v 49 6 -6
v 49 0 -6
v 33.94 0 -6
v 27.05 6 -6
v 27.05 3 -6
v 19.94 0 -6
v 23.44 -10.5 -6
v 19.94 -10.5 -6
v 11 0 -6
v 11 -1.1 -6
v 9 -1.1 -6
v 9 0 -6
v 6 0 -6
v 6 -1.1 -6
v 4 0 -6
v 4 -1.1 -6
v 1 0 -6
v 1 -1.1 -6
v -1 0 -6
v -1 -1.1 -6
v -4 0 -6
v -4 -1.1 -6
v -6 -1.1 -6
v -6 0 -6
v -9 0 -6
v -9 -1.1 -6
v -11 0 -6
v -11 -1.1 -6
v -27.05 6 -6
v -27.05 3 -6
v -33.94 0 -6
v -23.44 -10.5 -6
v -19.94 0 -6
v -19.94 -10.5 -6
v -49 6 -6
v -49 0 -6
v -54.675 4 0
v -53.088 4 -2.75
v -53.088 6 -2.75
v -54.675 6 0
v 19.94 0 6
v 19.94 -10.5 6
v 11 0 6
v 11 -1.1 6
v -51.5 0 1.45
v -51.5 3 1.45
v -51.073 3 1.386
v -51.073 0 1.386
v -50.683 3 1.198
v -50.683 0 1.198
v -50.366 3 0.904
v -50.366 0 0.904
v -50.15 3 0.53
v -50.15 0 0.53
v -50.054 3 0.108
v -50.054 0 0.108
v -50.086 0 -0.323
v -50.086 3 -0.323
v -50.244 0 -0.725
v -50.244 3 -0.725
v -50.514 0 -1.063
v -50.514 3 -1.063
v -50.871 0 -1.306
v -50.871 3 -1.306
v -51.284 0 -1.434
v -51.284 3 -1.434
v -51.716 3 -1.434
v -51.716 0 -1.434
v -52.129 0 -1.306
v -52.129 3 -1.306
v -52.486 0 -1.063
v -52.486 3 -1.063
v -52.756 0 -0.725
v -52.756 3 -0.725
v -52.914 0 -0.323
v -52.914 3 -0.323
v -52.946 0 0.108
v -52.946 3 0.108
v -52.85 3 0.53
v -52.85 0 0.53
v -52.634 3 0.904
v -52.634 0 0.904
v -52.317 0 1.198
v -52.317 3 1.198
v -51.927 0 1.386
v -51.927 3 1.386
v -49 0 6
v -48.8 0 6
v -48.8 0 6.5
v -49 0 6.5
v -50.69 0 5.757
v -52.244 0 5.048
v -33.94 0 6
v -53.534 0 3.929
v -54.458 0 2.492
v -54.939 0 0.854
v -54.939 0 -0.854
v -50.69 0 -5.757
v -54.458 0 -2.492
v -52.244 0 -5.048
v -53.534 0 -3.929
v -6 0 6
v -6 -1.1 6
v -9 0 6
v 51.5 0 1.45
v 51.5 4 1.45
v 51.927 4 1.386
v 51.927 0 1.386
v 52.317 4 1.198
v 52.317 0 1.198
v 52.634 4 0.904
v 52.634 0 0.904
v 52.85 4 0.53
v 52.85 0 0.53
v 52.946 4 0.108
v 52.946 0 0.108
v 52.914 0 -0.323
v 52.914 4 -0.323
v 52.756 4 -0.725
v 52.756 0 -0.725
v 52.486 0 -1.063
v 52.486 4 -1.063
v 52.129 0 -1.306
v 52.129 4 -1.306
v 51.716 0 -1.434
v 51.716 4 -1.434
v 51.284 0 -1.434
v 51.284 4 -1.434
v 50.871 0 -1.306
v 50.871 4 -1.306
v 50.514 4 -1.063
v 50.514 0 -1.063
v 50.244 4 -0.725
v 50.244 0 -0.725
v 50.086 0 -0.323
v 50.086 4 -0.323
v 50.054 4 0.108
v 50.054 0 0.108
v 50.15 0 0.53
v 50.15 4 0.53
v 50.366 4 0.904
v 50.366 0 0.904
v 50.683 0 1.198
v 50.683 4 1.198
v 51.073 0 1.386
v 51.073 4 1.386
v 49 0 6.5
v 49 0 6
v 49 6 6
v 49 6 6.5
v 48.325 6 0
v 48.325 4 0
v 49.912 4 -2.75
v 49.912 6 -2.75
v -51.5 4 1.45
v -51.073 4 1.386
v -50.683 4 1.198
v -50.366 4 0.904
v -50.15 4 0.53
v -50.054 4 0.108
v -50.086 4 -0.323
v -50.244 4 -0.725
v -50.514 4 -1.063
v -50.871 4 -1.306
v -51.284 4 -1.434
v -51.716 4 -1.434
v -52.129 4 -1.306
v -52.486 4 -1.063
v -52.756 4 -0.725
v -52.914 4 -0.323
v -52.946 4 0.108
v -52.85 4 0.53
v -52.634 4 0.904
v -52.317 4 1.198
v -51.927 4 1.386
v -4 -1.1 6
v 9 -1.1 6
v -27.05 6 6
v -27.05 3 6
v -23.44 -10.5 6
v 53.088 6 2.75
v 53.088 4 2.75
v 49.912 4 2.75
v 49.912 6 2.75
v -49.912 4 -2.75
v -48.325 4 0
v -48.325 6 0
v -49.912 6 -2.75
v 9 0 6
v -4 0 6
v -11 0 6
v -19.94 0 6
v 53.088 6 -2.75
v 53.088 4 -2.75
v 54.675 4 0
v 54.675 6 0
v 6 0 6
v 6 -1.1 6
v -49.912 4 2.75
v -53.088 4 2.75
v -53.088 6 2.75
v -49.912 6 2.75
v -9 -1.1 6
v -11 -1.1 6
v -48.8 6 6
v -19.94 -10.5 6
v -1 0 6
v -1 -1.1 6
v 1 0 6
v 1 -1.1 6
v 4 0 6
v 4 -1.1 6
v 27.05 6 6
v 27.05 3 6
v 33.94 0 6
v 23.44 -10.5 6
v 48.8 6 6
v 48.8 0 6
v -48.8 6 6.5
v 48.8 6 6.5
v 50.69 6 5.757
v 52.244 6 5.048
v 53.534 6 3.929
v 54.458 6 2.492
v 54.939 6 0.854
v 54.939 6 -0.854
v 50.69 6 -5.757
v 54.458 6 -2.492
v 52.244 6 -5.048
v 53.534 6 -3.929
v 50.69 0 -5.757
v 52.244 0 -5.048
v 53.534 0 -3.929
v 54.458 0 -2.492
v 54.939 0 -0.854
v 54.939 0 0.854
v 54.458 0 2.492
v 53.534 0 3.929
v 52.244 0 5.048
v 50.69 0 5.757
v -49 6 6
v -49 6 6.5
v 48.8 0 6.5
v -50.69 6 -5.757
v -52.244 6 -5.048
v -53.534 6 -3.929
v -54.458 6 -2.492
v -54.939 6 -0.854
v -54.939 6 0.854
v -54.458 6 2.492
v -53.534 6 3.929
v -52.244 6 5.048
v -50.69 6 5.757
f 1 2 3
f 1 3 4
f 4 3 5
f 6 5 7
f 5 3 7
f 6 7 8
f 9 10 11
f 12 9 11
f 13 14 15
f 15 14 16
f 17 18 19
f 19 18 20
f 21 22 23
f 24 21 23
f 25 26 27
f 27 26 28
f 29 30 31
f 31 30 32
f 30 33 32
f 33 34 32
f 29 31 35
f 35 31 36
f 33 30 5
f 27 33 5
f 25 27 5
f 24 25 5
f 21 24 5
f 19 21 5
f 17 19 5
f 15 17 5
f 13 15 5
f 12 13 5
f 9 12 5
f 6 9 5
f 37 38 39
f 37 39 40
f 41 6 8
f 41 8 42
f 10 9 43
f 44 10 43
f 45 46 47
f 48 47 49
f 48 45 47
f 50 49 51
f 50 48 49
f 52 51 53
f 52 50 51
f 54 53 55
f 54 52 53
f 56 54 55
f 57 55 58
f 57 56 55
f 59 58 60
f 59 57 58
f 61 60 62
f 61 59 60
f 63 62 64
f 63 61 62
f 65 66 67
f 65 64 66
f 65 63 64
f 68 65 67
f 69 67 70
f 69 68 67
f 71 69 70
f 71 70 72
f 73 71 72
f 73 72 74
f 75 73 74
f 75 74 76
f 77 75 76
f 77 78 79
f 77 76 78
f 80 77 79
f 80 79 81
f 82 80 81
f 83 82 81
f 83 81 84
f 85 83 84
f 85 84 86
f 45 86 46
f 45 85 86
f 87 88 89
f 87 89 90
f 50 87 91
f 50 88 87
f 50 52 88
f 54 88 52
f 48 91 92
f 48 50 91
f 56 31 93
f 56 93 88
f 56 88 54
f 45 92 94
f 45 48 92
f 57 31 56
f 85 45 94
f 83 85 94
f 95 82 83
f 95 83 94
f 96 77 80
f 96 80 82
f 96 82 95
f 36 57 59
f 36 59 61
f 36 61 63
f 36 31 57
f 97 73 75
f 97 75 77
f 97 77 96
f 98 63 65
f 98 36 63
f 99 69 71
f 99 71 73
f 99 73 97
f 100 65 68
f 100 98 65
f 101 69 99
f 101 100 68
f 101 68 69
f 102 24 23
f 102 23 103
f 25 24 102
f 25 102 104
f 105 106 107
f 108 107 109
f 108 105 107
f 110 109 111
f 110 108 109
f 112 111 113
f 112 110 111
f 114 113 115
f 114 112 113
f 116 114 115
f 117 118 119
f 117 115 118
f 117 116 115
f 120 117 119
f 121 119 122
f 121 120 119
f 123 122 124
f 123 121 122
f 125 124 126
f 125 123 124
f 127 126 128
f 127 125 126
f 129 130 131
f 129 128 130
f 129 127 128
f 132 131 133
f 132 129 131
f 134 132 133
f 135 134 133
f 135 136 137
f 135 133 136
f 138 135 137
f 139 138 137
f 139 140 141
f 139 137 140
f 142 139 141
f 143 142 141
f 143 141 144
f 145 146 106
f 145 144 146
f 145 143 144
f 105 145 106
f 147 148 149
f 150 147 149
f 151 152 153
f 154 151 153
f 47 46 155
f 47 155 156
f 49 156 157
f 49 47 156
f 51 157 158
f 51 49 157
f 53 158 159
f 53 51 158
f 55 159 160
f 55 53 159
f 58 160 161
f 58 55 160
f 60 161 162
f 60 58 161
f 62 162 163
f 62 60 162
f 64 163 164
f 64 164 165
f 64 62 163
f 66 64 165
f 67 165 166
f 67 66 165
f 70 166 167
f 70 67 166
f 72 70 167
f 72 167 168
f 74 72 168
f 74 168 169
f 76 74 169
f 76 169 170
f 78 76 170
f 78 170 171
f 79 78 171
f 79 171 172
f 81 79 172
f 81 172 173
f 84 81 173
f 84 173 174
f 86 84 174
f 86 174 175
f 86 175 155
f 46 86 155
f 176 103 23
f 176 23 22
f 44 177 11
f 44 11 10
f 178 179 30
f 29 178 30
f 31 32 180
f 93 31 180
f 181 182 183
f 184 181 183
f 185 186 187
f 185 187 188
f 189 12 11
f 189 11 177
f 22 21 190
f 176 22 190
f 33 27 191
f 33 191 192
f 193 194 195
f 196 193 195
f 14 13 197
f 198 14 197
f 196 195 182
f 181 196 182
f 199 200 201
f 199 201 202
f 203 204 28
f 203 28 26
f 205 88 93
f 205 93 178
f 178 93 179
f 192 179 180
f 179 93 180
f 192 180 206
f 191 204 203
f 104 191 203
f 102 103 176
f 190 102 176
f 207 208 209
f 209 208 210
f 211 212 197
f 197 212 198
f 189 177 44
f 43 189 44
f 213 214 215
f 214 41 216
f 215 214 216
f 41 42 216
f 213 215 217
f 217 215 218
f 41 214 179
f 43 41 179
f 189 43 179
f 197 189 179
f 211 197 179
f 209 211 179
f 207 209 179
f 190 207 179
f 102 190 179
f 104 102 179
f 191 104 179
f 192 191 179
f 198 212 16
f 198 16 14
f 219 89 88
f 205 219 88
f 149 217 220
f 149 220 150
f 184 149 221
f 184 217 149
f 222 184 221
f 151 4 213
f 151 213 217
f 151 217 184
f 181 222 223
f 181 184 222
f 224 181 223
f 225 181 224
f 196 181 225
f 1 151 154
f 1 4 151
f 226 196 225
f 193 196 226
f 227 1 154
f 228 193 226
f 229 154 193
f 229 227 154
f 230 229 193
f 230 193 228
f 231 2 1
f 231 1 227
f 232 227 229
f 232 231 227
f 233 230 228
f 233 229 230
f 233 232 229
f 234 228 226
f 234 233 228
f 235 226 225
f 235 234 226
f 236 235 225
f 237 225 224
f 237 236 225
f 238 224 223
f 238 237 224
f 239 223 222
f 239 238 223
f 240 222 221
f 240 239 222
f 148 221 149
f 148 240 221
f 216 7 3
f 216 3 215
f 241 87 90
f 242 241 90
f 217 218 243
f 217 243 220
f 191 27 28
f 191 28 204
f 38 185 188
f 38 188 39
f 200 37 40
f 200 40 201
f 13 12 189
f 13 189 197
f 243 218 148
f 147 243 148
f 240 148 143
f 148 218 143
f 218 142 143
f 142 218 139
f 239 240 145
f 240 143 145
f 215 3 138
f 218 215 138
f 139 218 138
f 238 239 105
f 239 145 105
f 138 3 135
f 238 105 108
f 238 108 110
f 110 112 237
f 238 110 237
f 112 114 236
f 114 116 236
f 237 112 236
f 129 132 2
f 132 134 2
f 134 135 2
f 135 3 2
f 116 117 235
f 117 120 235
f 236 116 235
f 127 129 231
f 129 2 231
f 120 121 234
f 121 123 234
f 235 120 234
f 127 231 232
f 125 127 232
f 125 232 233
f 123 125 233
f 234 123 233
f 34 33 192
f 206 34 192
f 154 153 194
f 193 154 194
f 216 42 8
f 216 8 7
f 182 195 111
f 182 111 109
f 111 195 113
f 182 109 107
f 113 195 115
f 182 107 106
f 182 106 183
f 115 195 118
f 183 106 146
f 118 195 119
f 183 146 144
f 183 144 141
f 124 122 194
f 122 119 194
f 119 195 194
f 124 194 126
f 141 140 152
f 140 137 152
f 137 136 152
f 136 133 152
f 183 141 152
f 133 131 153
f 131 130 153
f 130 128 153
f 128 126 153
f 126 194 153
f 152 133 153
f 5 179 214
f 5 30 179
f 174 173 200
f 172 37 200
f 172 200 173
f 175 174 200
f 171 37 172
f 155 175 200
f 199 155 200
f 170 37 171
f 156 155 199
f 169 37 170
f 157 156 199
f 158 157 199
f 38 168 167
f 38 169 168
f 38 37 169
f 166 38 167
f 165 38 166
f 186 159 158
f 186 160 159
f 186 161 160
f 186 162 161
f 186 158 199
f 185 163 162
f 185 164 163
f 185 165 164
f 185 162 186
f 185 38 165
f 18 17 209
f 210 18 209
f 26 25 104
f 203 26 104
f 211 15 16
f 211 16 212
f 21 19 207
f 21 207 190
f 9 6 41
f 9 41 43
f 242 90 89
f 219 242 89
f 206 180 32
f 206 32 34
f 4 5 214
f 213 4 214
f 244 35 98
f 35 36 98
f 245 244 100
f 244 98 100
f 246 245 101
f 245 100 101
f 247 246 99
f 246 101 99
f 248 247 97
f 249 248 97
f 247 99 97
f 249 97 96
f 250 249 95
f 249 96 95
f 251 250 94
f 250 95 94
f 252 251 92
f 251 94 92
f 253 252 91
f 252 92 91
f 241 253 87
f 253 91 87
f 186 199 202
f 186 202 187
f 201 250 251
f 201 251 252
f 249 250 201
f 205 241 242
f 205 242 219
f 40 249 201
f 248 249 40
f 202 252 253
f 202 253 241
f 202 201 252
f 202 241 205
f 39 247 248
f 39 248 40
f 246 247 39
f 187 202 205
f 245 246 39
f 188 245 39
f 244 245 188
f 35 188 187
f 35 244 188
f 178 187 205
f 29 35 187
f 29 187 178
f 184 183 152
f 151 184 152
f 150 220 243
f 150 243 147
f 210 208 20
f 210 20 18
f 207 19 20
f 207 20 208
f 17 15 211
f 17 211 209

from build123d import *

# Parameters (mm, degrees)
SKETCH1_R                 = 1.45
BOSS_EXTRUDE1_DEPTH       = 3
SKETCH4_W                 = 3.5
SKETCH4_H                 = 12
BOSS_EXTRUDE3_DEPTH       = 10.5
SKETCH5_W                 = 2
SKETCH5_H                 = 12
BOSS_EXTRUDE4_DEPTH       = 1.1
SKETCH6_W                 = 0.2
SKETCH6_H                 = 3
BOSS_EXTRUDE5_DEPTH       = 0.5
CHAMFER1_SIZE             = 10.5
F_3_0MM_DOWEL_HOLE1_D     = 2.9
F_3_0MM_DOWEL_HOLE1_DEPTH = 13.5
SKETCH10_R                = 1.45
BOSS_EXTRUDE6_DEPTH       = 3
CUT_EXTRUDE1_START        = -2
SKETCH11_R                = 1.45
CUT_EXTRUDE1_DEPTH        = 2


with BuildPart() as part:
    # Sketch1 → Boss-Extrude1 (new body)
    with BuildSketch(Plane(origin=(0, 0, 0), x_dir=(1, 0, 0), z_dir=(0, 1, 0))):
        with BuildLine():
            Line((-49, 6), (49, 6))
            ThreePointArc((49, 6), (55, 0), (49, -6))
            Line((49, -6), (-49, -6))
            ThreePointArc((-49, -6), (-55, 0), (-49, 6))
        make_face()
        with Locations(Location((-51.5, 0, 0), (0, 0, 270))):
            Circle(SKETCH1_R, mode=Mode.SUBTRACT)
        with Locations(Location((51.5, 0, 0), (0, 0, 270))):
            Circle(SKETCH1_R, mode=Mode.SUBTRACT)
    extrude(amount=BOSS_EXTRUDE1_DEPTH)

    # Sketch4 → Boss-Extrude3 (add)
    with BuildSketch(Plane.XZ):
        with Locations((-21.690023983, 0)):
            Rectangle(SKETCH4_W, SKETCH4_H)
        with Locations((21.690023983, 0)):
            Rectangle(SKETCH4_W, SKETCH4_H)
    extrude(amount=BOSS_EXTRUDE3_DEPTH)

    # Sketch5 → Boss-Extrude4 (add)
    with BuildSketch(Plane.XZ):
        with Locations((5, 0)):
            Rectangle(SKETCH5_W, SKETCH5_H)
        Rectangle(SKETCH5_W, SKETCH5_H)
        with Locations((10, 0)):
            Rectangle(SKETCH5_W, SKETCH5_H)
        with Locations((-5, 0)):
            Rectangle(SKETCH5_W, SKETCH5_H)
        with Locations((-10, 0)):
            Rectangle(SKETCH5_W, SKETCH5_H)
    extrude(amount=BOSS_EXTRUDE4_DEPTH)

    # Sketch6 → Boss-Extrude5 (add)
    with BuildSketch(Plane.XY.offset(6)):
        with Locations((48.9, 1.5)):
            Rectangle(SKETCH6_W, SKETCH6_H)
        with Locations((-48.9, 1.5)):
            Rectangle(SKETCH6_W, SKETCH6_H)
    extrude(amount=BOSS_EXTRUDE5_DEPTH)

    # Chamfer1
    chamfer1_edges = [part.edges().sort_by_distance(p)[0] for p in [
        (23.440023983, 0, 0),
        (-23.440023983, 0, 0),
    ]]
    chamfer(chamfer1_edges, length=CHAMFER1_SIZE - 0.0001)  # a hair under: the kernel refuses the full size

    # Ø3.0mm Dowel Hole1
    with Locations(Plane(origin=(0, 3, 0), x_dir=(1, 0, 0), z_dir=(0, 1, 0))):
        with Locations((-51.5, 0), (51.5, 0)):
            Hole(F_3_0MM_DOWEL_HOLE1_D / 2, depth=F_3_0MM_DOWEL_HOLE1_DEPTH)

    # Sketch10 → Boss-Extrude6 (add)
    # profile 1 of 2: a face of its own
    with BuildSketch(Plane(origin=(0, 3, 0), x_dir=(1, 0, 0), z_dir=(0, 1, 0))):
        with BuildLine():
            Line((-48.8, -6), (-27.05, -6))
            Line((-27.05, -6), (-27.05, 6))
            Line((-27.05, 6), (-49, 6))
            ThreePointArc((-49, 6), (-55, 0), (-49, -6))
            Line((-49, -6), (-49, -6.5))
            Line((-49, -6.5), (-48.8, -6.5))
            Line((-48.8, -6.5), (-48.8, -6))
        make_face()
        with Locations(Location((-51.5, 0, 0), (0, 0, 270.000000001))):
            Circle(SKETCH10_R, mode=Mode.SUBTRACT)
    # profile 2 of 2: a face of its own
    with BuildSketch(Plane(origin=(0, 3, 0), x_dir=(1, 0, 0), z_dir=(0, 1, 0))):
        with BuildLine():
            Line((27.05, 6), (27.05, -6))
            Line((27.05, -6), (48.8, -6))
            Line((48.8, -6), (48.8, -6.5))
            Line((48.8, -6.5), (49, -6.5))
            Line((49, -6.5), (49, -6))
            ThreePointArc((49, -6), (55, 0), (49, 6))
            Line((49, 6), (27.05, 6))
        make_face()
        with Locations(Location((51.5, 0, 0), (0, 0, 270))):
            Circle(SKETCH10_R, mode=Mode.SUBTRACT)
    extrude(amount=BOSS_EXTRUDE6_DEPTH)

    # Sketch11 → Cut-Extrude1 (cut)
    # profile 1 of 2: a face of its own
    with BuildSketch(Plane(origin=(0, 6, 0), x_dir=(1, 0, 0), z_dir=(0, 1, 0)).offset(CUT_EXTRUDE1_START)):
        Polygon((53.08771324, 2.75), (54.675426481, 0), (53.08771324, -2.75), (49.91228676, -2.75), (48.324573519, 0), (49.91228676, 2.75), align=None)
    # profile 2 of 2: a face of its own
    with BuildSketch(Plane(origin=(0, 6, 0), x_dir=(1, 0, 0), z_dir=(0, 1, 0)).offset(CUT_EXTRUDE1_START)):
        Polygon((-48.324573519, 0), (-49.91228676, 2.75), (-53.08771324, 2.75), (-54.675426481, 0), (-53.08771324, -2.75), (-49.91228676, -2.75), align=None)
        with Locations(Location((-51.5, 0, 0), (0, 0, 270.000000001))):
            Circle(SKETCH11_R, mode=Mode.SUBTRACT)
    extrude(amount=CUT_EXTRUDE1_DEPTH, mode=Mode.SUBTRACT)


solid = part.part
